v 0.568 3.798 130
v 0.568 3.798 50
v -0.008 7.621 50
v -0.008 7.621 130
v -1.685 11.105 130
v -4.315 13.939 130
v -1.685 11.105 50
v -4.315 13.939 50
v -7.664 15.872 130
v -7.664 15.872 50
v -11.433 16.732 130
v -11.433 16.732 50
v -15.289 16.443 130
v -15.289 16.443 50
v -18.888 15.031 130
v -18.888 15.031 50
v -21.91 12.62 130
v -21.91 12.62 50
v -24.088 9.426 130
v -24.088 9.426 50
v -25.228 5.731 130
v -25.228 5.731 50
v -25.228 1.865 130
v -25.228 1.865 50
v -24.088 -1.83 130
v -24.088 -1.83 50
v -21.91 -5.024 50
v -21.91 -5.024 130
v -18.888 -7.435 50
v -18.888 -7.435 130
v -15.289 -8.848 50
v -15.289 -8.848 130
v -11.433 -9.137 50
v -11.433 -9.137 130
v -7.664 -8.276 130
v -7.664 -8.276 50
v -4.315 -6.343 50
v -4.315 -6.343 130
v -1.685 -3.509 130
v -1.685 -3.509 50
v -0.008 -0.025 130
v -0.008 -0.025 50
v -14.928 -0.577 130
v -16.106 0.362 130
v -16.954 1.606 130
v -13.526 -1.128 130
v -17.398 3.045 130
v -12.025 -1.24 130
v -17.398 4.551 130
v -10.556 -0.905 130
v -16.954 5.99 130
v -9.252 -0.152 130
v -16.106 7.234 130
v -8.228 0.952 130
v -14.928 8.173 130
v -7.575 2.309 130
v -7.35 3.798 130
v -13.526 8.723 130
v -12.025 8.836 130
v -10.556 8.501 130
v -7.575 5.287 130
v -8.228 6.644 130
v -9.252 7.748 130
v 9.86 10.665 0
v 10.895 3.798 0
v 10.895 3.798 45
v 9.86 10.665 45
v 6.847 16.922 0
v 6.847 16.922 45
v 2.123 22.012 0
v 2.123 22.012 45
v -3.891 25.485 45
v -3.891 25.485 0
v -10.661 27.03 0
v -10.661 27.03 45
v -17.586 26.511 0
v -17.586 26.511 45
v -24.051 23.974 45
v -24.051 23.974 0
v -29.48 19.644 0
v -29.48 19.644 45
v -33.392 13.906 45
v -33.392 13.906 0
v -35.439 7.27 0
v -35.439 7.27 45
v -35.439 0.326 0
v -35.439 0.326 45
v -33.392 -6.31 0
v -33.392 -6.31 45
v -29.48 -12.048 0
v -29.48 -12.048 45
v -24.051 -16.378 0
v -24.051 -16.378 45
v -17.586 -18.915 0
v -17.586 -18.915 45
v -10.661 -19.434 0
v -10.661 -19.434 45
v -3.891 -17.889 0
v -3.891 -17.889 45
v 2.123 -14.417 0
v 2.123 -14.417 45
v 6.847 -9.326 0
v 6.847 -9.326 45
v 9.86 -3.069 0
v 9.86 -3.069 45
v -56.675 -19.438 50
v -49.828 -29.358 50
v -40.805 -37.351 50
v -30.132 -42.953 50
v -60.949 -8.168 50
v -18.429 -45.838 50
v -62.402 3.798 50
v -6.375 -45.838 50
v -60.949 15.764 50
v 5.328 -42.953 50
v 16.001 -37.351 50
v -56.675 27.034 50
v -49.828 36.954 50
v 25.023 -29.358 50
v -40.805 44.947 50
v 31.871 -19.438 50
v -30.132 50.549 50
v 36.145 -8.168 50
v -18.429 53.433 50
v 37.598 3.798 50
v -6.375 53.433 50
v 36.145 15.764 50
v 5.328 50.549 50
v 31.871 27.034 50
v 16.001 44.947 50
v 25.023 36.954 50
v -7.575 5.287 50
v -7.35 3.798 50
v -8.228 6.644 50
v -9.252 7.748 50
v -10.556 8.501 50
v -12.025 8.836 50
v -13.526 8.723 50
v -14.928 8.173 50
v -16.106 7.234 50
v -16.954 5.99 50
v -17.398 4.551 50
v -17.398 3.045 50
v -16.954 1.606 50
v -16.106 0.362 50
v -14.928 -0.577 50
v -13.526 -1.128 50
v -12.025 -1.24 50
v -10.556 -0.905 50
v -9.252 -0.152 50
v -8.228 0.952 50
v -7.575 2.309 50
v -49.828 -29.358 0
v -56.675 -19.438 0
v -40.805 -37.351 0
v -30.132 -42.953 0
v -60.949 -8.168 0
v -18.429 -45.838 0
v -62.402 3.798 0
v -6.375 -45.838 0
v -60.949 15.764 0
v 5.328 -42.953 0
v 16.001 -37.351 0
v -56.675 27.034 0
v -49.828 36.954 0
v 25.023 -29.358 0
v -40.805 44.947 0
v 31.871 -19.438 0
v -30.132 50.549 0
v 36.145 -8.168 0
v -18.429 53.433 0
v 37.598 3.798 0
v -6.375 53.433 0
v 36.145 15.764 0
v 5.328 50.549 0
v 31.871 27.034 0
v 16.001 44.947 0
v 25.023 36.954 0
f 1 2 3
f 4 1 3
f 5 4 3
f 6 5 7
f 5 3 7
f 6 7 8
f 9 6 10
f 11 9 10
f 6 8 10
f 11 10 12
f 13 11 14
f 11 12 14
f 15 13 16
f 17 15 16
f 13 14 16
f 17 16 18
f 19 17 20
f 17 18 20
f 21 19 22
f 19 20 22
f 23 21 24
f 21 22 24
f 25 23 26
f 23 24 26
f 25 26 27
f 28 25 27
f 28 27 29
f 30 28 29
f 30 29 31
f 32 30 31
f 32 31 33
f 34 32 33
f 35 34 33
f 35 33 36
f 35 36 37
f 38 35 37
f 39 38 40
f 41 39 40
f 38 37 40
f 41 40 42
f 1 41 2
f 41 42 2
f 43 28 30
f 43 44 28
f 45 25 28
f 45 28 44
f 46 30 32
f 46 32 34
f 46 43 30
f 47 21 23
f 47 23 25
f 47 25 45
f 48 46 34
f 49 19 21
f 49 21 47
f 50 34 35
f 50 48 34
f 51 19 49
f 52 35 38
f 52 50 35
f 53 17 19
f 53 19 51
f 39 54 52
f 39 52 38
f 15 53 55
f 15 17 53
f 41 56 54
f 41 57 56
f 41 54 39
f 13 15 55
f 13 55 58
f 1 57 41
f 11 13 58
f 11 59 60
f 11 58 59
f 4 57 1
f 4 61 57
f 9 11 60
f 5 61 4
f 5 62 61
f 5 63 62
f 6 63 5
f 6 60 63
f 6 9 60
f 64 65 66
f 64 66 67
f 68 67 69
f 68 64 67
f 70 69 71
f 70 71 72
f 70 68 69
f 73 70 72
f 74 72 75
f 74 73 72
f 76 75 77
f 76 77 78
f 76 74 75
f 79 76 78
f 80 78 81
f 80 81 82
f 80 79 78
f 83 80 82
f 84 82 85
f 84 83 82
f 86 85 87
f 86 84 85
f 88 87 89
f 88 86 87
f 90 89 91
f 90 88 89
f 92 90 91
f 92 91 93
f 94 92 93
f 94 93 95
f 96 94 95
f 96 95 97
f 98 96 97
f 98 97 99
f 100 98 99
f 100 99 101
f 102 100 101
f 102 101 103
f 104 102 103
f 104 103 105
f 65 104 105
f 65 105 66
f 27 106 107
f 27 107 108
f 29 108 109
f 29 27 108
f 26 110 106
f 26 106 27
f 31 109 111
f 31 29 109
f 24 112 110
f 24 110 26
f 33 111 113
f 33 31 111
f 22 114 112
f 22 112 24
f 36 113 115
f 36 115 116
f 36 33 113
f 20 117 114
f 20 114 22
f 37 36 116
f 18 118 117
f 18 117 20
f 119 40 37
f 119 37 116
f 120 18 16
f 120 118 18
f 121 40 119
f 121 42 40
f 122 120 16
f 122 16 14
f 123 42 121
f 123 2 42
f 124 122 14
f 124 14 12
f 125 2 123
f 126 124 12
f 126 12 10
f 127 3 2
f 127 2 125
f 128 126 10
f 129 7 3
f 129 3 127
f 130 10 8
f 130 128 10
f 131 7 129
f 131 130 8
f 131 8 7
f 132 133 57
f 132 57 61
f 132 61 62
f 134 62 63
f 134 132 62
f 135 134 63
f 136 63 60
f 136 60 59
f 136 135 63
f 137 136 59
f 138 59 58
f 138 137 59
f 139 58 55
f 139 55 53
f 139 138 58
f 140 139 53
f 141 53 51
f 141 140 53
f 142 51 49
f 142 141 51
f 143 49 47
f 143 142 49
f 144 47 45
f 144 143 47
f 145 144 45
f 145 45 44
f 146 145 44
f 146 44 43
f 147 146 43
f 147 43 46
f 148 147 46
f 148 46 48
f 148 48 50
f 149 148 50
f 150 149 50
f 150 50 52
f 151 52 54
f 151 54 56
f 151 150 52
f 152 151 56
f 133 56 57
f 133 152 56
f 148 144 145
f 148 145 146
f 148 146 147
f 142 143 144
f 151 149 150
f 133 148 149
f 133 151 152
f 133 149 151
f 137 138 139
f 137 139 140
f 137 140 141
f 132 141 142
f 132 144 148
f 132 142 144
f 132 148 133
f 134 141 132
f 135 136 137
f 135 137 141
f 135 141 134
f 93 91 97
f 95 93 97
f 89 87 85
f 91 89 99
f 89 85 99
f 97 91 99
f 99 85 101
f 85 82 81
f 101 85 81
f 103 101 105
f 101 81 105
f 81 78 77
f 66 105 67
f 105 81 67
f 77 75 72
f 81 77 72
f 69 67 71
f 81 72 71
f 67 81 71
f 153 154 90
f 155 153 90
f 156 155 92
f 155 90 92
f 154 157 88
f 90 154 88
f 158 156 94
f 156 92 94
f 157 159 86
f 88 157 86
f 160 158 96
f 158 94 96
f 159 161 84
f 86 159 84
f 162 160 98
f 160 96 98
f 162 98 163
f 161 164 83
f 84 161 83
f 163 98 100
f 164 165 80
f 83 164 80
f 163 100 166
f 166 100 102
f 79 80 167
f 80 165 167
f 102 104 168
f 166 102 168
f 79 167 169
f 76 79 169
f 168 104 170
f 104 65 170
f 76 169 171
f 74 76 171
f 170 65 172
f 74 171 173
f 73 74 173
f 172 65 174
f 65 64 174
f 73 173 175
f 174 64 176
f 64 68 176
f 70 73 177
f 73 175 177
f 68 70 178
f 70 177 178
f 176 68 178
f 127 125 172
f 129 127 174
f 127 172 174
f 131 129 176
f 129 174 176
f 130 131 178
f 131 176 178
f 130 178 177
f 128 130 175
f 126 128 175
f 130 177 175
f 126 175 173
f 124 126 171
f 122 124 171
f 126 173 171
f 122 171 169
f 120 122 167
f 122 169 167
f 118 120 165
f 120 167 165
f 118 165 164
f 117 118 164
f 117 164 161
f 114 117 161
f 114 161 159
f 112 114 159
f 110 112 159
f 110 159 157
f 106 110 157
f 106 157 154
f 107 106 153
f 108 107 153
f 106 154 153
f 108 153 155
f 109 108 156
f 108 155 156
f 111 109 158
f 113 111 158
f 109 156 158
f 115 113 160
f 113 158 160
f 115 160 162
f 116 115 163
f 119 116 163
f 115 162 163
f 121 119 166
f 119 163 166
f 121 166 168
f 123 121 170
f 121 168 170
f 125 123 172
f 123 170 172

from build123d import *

# Parameters (mm, degrees)
F0_R     = 50
F0_R_2   = 23.297253
F1_DEPTH = 50
F2_R     = 23.297253
F3_DEPTH = 5
F4_R     = 12.970744
F4_R_2   = 5.052193
F5_DEPTH = 80


with BuildPart() as f1:
    # F0 (on Top) → F1 (new body)
    with BuildSketch(Plane.XY):
        with Locations((-12.402253, 3.797938)):
            Circle(F0_R)
        with Locations((-12.402253, 3.797938)):
            Circle(F0_R_2, mode=Mode.SUBTRACT)
    extrude(amount=F1_DEPTH)

    # F2 (on face) → F3 (join)
    with BuildSketch(Plane.XY.offset(50)):
        with Locations((-12.402253, 3.797938)):
            Circle(F2_R)
    extrude(amount=-F3_DEPTH)

    # F4 (on face) → F5 (join)
    with BuildSketch(Plane.XY.offset(50)):
        with Locations((-12.402253, 3.797938)):
            Circle(F4_R)
        with Locations((-12.402253, 3.797938)):
            Circle(F4_R_2, mode=Mode.SUBTRACT)
    extrude(amount=F5_DEPTH)


solid = f1.part
